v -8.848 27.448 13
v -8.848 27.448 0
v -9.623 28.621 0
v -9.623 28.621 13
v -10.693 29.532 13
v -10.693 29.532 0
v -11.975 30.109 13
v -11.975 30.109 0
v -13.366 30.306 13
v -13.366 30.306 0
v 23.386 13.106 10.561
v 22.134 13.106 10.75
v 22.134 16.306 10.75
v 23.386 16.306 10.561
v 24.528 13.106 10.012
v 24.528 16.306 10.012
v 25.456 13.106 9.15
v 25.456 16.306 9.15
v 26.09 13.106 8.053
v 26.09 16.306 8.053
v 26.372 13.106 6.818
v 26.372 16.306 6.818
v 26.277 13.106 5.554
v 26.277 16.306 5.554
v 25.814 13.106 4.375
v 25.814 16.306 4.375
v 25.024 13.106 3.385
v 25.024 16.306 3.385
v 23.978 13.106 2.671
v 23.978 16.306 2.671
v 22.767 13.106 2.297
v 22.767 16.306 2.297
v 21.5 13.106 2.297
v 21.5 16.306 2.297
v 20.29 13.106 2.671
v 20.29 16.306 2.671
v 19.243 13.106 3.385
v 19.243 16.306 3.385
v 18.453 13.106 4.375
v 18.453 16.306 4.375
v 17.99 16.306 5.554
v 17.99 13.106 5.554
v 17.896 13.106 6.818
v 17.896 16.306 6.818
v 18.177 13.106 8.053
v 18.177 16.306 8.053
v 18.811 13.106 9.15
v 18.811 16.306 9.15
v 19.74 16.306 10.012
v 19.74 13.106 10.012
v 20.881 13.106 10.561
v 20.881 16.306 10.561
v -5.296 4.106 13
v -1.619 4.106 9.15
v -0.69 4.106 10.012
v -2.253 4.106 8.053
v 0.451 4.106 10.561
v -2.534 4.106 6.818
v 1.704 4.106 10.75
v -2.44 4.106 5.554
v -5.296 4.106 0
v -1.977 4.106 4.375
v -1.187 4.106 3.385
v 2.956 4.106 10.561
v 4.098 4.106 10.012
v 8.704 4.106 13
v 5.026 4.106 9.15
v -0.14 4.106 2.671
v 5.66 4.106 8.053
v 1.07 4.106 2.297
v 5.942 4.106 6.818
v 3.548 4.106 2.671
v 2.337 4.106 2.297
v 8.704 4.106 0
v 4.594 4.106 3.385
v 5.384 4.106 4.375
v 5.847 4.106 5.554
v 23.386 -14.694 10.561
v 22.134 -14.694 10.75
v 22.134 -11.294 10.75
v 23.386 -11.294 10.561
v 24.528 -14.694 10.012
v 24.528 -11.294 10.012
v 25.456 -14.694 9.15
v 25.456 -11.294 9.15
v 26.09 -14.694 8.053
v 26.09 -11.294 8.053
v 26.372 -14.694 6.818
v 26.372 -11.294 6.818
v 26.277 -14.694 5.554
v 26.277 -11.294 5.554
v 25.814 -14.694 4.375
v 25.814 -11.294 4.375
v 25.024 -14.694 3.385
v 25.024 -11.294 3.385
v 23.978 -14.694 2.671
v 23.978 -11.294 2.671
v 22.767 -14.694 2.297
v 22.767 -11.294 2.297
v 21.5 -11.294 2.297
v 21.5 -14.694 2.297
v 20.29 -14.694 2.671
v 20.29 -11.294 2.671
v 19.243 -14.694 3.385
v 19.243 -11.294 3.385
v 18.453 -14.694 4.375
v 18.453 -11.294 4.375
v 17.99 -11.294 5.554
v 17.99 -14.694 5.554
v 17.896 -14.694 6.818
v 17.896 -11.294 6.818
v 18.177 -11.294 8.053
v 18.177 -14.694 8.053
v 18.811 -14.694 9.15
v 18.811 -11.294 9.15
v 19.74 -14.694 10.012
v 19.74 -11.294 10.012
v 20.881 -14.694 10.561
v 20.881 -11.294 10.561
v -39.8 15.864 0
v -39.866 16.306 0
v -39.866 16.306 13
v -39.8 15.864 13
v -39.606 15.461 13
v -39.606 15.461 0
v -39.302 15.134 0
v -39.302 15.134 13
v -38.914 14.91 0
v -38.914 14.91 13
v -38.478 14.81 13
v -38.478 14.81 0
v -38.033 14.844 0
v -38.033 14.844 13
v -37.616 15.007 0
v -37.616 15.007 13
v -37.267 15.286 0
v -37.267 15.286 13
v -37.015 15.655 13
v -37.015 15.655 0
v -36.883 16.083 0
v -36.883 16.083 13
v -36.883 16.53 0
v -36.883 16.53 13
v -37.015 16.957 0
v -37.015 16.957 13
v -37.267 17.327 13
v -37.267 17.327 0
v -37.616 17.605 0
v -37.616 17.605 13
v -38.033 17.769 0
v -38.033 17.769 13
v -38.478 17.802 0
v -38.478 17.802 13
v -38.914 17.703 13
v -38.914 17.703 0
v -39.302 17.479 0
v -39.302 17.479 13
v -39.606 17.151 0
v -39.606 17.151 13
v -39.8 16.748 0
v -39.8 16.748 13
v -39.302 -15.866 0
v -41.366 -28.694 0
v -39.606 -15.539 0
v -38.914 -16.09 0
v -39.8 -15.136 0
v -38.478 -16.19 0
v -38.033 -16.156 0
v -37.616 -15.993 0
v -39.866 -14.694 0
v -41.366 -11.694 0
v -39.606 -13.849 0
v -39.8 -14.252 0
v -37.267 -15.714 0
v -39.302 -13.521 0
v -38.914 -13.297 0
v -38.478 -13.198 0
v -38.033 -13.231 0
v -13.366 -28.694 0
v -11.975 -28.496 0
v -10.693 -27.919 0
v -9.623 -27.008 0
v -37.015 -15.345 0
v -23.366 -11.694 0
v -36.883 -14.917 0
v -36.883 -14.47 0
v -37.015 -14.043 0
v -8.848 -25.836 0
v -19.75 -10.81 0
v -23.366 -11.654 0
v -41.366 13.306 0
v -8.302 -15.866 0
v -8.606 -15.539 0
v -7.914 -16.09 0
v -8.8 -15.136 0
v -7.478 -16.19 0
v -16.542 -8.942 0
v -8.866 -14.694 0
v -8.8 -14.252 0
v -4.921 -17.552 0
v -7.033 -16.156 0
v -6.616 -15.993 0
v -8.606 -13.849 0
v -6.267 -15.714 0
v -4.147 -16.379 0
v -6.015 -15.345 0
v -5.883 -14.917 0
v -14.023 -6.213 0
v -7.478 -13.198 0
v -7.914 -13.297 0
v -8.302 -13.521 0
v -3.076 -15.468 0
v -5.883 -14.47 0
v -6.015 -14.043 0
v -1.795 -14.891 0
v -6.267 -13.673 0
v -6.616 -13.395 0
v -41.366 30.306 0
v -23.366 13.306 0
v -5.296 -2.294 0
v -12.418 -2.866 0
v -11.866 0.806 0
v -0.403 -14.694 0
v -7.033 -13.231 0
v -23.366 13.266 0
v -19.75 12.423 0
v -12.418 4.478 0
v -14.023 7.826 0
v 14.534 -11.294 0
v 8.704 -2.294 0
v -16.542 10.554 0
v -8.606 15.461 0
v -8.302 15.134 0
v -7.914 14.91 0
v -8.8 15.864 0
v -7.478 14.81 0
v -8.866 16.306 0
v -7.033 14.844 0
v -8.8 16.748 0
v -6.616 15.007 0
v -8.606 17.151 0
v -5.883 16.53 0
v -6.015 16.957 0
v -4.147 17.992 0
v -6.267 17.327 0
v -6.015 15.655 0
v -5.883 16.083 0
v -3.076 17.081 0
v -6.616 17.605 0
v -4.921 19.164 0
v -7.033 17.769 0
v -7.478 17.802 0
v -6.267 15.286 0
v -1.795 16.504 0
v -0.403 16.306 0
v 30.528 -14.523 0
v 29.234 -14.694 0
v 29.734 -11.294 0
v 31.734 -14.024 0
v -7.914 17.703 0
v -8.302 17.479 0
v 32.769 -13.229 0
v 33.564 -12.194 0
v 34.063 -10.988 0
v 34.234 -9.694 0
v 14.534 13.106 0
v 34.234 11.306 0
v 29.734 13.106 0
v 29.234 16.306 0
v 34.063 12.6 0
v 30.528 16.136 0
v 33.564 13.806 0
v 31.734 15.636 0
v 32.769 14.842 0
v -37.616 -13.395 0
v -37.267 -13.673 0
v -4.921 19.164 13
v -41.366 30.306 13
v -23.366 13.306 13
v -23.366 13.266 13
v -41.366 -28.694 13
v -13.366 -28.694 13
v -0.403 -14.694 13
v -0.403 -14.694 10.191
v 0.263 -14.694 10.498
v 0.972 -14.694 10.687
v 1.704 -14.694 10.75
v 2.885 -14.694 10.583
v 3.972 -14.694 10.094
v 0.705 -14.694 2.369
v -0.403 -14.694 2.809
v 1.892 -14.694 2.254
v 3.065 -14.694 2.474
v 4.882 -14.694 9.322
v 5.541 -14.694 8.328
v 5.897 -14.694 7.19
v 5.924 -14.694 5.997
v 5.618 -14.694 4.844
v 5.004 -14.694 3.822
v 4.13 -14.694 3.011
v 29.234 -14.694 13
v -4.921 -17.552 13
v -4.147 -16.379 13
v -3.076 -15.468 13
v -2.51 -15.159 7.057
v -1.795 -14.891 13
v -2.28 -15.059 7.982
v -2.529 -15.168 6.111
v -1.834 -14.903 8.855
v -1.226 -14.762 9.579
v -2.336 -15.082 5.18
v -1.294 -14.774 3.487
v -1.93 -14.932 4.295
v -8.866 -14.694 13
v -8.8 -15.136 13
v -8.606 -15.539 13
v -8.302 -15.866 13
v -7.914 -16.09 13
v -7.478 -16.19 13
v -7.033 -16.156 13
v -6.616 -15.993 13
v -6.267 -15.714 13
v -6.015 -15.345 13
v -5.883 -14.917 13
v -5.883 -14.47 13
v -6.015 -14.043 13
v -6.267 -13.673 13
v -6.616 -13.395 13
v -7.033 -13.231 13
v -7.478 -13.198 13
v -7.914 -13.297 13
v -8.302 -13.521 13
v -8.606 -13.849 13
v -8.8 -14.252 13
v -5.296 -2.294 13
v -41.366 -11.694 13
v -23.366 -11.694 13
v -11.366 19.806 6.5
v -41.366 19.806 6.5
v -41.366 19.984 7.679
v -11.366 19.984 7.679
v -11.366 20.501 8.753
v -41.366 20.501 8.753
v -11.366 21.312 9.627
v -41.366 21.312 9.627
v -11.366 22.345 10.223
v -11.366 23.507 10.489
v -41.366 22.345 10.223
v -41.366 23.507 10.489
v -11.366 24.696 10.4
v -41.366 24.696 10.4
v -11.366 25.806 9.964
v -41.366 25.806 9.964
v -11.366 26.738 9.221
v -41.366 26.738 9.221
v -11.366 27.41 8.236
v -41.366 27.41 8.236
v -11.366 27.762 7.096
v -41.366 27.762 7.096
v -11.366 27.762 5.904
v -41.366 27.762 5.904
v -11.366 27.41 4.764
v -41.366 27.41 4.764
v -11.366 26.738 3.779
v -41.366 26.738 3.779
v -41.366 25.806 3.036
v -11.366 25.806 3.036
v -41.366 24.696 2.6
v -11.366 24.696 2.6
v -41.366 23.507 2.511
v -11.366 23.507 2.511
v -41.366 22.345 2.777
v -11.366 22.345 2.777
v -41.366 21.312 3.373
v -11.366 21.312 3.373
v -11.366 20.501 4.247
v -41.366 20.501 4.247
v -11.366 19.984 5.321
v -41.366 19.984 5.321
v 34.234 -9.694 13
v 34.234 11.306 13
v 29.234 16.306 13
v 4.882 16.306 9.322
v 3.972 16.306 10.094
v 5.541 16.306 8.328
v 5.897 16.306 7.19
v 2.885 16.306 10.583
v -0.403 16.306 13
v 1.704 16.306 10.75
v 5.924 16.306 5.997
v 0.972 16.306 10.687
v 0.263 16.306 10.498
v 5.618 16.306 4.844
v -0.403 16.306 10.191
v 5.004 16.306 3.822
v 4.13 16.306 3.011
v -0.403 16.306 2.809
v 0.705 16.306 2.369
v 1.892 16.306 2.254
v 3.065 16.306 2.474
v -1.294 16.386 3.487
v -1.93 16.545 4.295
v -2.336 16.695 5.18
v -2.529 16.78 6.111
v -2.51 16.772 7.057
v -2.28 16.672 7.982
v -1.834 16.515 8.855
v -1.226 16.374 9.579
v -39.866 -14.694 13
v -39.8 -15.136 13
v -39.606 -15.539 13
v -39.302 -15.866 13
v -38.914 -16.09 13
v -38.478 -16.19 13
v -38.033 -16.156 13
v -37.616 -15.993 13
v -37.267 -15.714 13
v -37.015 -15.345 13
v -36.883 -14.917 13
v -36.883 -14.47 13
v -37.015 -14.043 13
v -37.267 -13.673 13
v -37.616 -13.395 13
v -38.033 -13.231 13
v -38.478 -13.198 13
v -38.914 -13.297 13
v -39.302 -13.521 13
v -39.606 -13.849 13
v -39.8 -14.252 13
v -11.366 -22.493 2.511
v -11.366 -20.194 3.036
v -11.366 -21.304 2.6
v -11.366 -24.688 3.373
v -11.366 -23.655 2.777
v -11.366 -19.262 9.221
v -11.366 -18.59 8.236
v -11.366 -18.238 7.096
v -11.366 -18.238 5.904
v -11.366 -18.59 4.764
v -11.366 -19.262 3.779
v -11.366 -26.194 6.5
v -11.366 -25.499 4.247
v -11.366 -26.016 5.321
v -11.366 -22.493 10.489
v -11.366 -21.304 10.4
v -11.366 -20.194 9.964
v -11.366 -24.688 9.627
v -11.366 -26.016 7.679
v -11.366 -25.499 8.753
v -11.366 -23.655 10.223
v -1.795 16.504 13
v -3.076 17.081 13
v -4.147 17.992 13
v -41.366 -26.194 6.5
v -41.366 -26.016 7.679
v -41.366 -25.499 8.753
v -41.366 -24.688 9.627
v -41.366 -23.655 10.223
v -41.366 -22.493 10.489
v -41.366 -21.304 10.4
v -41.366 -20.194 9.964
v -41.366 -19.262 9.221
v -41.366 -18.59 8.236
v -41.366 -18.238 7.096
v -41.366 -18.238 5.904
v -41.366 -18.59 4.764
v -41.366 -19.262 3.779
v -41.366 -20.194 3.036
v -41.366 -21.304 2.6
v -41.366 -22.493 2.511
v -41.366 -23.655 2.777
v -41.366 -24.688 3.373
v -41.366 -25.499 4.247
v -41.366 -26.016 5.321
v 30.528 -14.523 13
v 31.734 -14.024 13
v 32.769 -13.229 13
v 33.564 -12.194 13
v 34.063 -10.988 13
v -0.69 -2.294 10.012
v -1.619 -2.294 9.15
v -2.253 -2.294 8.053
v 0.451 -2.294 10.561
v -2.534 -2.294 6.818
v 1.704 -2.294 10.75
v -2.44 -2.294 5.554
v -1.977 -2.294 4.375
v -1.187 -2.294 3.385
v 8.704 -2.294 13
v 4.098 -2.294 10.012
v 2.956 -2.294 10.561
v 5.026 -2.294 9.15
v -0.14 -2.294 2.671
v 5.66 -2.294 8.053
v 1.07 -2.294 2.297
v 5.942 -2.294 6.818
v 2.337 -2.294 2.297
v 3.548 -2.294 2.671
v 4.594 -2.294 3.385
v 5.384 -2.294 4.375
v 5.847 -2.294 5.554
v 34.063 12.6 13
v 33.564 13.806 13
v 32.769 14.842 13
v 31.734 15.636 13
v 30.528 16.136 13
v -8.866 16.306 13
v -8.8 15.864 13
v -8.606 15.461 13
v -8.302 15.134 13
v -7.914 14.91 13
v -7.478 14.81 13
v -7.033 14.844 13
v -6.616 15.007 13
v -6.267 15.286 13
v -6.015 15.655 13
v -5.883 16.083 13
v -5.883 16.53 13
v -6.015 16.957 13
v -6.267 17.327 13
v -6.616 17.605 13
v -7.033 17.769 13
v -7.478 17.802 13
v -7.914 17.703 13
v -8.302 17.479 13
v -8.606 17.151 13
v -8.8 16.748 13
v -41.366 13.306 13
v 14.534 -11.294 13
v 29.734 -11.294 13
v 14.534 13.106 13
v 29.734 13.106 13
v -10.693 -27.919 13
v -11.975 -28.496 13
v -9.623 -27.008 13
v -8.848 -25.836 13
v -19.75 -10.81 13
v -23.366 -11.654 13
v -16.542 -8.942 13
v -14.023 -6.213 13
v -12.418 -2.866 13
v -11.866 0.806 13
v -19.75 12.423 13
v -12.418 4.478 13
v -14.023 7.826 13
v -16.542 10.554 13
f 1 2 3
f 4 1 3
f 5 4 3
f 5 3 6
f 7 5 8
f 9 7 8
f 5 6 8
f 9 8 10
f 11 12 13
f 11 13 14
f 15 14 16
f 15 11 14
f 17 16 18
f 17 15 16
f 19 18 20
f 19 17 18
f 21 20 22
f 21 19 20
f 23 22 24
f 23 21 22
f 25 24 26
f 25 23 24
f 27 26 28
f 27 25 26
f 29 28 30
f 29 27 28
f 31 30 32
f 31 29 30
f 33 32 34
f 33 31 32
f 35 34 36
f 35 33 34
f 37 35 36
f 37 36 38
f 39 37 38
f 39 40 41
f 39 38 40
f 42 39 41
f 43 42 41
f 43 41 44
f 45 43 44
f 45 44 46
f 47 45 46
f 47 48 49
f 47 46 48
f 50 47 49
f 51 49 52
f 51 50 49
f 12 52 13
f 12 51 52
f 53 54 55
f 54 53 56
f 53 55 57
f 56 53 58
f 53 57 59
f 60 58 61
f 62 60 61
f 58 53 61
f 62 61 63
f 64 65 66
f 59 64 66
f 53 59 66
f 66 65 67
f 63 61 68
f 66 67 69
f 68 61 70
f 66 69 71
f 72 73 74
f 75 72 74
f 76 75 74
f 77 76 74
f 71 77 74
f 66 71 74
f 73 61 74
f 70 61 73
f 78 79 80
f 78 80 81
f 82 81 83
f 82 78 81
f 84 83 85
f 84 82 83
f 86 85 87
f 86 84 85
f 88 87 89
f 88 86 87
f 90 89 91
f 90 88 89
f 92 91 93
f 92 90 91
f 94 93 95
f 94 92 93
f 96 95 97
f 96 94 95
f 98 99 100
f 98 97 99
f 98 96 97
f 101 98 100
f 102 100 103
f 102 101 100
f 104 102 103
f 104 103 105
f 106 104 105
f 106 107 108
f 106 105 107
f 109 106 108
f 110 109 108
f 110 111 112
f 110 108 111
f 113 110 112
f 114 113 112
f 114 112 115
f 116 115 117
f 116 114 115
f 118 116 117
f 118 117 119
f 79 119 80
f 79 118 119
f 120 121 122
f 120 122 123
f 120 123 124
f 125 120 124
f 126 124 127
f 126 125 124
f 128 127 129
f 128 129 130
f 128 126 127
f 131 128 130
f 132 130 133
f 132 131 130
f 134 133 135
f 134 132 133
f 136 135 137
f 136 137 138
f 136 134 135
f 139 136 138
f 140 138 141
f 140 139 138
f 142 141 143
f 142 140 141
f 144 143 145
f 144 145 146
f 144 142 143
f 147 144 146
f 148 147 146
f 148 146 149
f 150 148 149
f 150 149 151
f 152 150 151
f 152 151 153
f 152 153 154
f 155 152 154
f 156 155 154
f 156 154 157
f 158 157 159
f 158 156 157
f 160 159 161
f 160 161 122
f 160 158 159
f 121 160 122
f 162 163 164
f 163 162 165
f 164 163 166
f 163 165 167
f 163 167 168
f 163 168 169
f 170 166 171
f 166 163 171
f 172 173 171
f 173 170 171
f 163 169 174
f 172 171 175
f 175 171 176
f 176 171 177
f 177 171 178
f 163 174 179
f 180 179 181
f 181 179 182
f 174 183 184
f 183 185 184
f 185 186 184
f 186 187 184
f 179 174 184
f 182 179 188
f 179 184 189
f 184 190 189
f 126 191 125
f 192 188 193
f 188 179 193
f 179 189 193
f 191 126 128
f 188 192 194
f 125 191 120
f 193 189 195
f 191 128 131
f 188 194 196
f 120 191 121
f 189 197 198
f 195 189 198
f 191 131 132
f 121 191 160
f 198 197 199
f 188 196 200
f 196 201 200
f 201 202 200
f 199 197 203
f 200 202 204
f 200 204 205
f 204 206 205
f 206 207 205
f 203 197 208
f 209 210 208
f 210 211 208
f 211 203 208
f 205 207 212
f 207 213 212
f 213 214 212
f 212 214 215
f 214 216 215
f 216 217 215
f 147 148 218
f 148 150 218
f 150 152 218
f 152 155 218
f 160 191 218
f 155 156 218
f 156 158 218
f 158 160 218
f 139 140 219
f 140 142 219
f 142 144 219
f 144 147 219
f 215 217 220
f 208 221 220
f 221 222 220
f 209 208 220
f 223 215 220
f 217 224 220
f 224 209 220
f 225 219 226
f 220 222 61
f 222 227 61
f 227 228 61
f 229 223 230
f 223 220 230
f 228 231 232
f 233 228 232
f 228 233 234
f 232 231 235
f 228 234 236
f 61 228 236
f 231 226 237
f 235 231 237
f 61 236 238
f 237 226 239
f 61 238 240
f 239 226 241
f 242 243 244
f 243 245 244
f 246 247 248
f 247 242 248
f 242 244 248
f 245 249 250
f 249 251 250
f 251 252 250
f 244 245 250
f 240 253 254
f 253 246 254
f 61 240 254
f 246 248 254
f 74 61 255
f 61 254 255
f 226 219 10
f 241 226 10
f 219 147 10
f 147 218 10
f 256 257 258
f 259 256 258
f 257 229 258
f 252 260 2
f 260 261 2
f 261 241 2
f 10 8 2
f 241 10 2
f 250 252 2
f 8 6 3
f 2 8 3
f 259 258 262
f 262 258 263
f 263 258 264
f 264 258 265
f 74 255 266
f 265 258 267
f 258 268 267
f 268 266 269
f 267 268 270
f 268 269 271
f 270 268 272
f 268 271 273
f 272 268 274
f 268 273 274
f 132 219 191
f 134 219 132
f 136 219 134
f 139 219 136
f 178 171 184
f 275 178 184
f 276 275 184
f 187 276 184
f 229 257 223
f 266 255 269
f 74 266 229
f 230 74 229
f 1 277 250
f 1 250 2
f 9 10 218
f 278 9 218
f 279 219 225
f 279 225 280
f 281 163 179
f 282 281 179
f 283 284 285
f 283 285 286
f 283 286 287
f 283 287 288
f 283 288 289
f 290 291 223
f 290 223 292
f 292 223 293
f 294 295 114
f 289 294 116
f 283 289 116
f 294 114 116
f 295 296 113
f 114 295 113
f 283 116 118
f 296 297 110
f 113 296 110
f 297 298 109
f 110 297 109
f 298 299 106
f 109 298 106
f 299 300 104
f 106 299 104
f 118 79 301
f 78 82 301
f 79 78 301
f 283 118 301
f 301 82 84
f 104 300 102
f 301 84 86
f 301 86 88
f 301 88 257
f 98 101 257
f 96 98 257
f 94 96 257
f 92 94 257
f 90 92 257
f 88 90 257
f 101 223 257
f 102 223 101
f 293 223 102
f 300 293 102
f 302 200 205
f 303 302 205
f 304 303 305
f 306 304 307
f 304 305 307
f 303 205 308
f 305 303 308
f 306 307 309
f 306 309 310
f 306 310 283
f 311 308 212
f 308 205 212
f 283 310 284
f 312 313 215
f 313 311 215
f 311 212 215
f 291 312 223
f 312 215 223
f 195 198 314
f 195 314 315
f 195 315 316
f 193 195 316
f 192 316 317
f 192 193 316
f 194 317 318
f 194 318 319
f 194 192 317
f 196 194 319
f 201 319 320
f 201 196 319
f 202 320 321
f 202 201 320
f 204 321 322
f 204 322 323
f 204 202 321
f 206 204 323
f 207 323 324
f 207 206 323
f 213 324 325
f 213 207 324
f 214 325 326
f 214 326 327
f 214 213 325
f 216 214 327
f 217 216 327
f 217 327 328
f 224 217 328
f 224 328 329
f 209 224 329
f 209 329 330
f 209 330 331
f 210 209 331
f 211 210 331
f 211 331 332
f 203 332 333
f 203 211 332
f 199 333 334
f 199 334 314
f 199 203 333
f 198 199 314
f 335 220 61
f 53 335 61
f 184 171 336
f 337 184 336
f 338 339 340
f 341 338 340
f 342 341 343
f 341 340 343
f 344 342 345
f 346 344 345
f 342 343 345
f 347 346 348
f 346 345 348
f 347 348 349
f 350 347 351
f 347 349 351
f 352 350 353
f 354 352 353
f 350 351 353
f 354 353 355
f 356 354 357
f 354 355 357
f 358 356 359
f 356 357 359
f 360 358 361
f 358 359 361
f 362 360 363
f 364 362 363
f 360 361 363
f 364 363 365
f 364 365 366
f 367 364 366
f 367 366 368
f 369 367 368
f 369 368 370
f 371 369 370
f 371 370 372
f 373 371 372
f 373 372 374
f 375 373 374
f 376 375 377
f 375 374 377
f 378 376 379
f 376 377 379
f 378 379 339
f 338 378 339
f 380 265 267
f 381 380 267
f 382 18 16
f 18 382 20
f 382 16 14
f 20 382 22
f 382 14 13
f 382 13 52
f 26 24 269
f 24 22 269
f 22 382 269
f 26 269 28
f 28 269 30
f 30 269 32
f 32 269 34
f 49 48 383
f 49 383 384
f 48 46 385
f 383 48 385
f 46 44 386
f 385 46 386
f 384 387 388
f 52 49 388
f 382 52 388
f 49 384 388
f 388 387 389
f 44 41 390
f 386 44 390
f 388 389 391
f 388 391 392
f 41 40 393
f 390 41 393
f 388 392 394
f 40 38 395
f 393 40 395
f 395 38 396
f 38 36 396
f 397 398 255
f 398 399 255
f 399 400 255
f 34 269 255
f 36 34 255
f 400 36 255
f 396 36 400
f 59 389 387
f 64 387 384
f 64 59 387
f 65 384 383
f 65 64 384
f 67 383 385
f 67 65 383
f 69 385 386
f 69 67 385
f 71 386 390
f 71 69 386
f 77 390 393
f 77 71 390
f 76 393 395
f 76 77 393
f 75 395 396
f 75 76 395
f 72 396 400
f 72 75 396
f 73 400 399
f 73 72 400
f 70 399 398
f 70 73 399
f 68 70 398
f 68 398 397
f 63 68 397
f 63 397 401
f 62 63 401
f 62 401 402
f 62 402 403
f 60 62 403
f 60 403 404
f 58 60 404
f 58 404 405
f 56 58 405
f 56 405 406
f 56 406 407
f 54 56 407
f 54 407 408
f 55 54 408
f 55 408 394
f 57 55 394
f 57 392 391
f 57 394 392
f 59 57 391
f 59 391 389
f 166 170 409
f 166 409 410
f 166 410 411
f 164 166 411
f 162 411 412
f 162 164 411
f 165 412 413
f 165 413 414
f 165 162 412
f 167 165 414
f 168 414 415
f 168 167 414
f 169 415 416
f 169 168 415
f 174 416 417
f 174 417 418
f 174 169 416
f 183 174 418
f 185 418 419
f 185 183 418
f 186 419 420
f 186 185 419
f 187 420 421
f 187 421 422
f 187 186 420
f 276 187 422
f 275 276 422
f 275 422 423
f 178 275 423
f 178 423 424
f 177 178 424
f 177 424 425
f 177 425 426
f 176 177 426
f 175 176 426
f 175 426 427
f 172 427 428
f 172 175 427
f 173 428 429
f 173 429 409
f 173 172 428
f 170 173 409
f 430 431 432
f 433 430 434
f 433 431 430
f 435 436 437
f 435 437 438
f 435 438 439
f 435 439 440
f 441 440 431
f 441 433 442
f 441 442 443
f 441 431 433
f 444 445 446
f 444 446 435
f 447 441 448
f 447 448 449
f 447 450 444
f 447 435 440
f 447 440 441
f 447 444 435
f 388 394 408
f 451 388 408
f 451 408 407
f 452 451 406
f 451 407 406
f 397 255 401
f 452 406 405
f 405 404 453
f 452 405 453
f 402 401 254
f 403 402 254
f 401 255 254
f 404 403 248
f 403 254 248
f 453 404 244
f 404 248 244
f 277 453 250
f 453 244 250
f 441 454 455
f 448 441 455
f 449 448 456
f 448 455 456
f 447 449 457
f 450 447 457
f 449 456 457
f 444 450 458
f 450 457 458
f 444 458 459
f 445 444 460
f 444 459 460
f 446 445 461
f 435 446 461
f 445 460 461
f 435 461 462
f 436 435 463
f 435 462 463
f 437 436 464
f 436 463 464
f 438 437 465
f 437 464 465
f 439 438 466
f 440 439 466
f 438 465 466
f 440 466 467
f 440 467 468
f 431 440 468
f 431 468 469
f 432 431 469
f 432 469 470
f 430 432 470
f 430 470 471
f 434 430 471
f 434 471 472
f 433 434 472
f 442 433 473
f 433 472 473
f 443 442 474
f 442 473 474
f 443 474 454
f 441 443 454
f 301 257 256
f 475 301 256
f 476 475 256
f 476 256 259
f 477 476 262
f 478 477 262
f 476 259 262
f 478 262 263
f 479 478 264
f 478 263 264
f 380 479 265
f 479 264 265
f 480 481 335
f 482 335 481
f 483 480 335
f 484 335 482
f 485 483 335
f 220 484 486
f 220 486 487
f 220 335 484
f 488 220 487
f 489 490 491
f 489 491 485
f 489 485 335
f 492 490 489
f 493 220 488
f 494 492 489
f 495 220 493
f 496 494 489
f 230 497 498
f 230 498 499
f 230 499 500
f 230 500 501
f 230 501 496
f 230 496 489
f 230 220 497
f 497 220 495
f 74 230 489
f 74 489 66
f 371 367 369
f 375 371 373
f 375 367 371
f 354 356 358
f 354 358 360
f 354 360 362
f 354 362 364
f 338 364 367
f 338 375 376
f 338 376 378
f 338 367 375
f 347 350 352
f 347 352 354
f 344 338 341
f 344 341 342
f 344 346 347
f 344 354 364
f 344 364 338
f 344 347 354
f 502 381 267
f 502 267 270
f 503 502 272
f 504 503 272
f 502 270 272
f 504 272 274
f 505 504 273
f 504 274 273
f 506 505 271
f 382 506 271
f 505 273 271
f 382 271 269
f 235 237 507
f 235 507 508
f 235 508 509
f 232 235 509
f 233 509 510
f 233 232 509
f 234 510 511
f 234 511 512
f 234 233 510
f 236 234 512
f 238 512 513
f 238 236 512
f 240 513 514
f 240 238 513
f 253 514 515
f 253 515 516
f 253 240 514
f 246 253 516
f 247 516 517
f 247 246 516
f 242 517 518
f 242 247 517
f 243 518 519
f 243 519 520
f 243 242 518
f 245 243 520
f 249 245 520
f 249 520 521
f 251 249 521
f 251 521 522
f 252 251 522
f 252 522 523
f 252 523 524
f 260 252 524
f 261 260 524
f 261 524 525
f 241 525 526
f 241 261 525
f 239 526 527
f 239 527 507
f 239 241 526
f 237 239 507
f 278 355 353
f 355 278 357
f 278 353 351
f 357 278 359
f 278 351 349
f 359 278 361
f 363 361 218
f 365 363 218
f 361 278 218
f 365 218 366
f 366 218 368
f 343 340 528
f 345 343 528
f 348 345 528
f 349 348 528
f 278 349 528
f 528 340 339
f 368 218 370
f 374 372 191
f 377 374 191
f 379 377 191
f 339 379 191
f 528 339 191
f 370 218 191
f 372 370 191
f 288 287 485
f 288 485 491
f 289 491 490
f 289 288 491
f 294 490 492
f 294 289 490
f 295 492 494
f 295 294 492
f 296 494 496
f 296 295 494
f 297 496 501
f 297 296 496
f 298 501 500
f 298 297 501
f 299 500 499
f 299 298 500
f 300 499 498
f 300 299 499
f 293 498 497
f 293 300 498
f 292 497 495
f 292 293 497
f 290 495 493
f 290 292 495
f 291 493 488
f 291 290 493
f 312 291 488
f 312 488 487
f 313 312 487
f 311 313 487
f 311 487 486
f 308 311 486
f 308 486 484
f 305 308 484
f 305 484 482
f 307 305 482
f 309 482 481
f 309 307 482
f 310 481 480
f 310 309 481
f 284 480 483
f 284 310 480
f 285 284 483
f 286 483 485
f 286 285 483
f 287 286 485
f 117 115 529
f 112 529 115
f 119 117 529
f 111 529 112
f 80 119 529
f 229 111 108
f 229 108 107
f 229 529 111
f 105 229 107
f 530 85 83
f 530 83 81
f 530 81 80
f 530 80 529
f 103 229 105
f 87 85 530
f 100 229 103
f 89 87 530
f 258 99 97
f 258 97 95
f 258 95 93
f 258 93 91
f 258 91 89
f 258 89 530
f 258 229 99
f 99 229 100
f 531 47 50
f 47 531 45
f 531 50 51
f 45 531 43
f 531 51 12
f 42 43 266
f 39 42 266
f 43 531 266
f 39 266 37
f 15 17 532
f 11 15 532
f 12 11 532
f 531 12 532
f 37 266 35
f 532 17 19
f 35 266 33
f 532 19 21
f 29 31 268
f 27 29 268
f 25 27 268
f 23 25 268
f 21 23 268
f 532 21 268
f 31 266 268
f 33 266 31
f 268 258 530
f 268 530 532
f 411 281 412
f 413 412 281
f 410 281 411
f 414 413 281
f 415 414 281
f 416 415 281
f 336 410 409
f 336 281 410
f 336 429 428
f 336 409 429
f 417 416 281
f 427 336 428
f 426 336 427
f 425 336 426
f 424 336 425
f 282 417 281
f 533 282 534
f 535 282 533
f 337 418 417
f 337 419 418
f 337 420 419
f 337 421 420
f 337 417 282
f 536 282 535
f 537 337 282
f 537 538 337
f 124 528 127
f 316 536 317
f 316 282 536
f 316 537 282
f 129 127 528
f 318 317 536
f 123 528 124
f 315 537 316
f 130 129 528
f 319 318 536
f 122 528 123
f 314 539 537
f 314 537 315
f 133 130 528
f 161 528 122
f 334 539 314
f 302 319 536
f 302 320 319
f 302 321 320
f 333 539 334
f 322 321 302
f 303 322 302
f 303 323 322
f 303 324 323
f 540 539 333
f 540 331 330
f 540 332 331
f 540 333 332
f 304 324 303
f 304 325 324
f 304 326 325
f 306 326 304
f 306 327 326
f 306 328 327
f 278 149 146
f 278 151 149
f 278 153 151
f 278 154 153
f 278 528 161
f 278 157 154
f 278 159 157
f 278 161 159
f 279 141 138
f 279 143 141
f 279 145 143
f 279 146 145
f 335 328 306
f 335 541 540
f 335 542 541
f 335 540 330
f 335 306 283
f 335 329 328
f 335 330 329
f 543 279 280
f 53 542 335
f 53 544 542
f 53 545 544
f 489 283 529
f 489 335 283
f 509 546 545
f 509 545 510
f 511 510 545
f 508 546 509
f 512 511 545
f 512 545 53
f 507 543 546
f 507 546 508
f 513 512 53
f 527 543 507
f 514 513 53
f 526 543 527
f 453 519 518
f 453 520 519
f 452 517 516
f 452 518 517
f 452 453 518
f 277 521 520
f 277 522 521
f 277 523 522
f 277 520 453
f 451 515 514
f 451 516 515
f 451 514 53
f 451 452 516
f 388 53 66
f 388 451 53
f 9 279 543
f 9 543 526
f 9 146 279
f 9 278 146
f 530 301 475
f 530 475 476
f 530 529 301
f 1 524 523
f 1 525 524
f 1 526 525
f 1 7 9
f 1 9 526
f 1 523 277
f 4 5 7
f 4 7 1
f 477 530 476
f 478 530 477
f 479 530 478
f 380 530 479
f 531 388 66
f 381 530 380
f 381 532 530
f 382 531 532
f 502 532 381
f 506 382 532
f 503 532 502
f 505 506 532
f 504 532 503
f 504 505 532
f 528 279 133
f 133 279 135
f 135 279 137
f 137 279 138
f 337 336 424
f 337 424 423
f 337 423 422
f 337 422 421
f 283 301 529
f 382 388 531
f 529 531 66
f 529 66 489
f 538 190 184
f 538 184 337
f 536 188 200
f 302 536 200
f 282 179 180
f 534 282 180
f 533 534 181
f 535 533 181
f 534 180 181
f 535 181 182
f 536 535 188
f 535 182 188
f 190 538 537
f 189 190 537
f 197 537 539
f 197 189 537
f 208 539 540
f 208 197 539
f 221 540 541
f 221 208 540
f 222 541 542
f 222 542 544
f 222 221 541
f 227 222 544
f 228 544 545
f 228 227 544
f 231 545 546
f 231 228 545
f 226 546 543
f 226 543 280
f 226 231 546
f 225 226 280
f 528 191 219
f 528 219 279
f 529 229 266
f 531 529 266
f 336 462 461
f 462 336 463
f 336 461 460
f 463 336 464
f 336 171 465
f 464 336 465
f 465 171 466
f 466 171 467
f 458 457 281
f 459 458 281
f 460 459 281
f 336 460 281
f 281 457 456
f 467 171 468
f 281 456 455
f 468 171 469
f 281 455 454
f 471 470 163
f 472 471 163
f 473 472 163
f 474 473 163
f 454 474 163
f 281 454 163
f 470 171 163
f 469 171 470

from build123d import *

# Parameters (mm, degrees)
CROQUIS2_R                 = 1.5
CROQUIS2_R_2               = 12.5
CROQUIS2_W                 = 14
CROQUIS2_H                 = 6.4
CROQUIS2_W_2               = 15.2
CROQUIS2_H_2               = 24.4
SALIENTE_EXTRUIR1_DEPTH    = 13
CROQUIS3_R                 = 4
CORTAR_EXTRUIR1_DEPTH      = 30
CROQUIS4_W                 = 13
CROQUIS4_H                 = 25
CORTAR_EXTRUIR2_DEPTH      = 18
CORTAR_EXTRUIR3_DEPTH      = 63.491392709
CORTAR_EXTRUIR3_DEPTH_BACK = 63.491392709
CROQUIS5_R                 = 4.25


with BuildPart() as part:
    # Croquis2 → Saliente-Extruir1 (new body)
    # profile 1 of 2: a face of its own
    with BuildSketch(Plane.XY):
        with BuildLine():
            Line((-41.366340939, 30.306283288), (-41.366340939, 19.306283288))
            Line((-41.366340939, 19.306283288), (-41.366340939, -17.693716712))
            Line((-41.366340939, -17.693716712), (-41.366340939, -28.693716712))
            Line((-41.366340939, -28.693716712), (-13.366340939, -28.693716712))
            ThreePointArc((-13.366340939, -28.693716712), (-10.693254692, -27.919188273), (-8.848320971, -25.835560677))
            Line((-8.848320971, -25.835560677), (-4.921298265, -17.551872747))
            ThreePointArc((-4.921298265, -17.551872747), (-3.076364545, -15.468245151), (-0.403278298, -14.693716712))
            Line((-0.403278298, -14.693716712), (29.233659061, -14.693716712))
            ThreePointArc((29.233659061, -14.693716712), (32.769192967, -13.229250618), (34.233659061, -9.693716712))
            Line((34.233659061, -9.693716712), (34.233659061, 11.306283288))
            ThreePointArc((34.233659061, 11.306283288), (32.769192967, 14.841817194), (29.233659061, 16.306283288))
            Line((29.233659061, 16.306283288), (-0.403278298, 16.306283288))
            ThreePointArc((-0.403278298, 16.306283288), (-3.076364545, 17.080811727), (-4.921298265, 19.164439323))
            Line((-4.921298265, 19.164439323), (-8.848320971, 27.448127253))
            ThreePointArc((-8.848320971, 27.448127253), (-10.693254692, 29.531754849), (-13.366340939, 30.306283288))
            Line((-13.366340939, 30.306283288), (-41.366340939, 30.306283288))
        make_face()
        with Locations(Location((-38.366340939, -14.693716712, 0), (0, 0, 180))):
            Circle(CROQUIS2_R, mode=Mode.SUBTRACT)
        with Locations(Location((-7.366340939, -14.693716712, 0), (0, 0, 180))):
            Circle(CROQUIS2_R, mode=Mode.SUBTRACT)
        with Locations(Location((-24.366340939, 0.806283288, 0), (0, 0, 180))):
            Circle(CROQUIS2_R_2, mode=Mode.SUBTRACT)
        with Locations(Location((-38.366340939, 16.306283288, 0), (0, 0, 180))):
            Circle(CROQUIS2_R, mode=Mode.SUBTRACT)
        with Locations(Location((-7.366340939, 16.306283288, 0), (0, 0, 180))):
            Circle(CROQUIS2_R, mode=Mode.SUBTRACT)
        with Locations((1.703659061, 0.906283288)):
            Rectangle(CROQUIS2_W, CROQUIS2_H, mode=Mode.SUBTRACT)
        with Locations((22.133659061, 0.906283288)):
            Rectangle(CROQUIS2_W_2, CROQUIS2_H_2, mode=Mode.SUBTRACT)
    # profile 2 of 2: a face of its own
    with BuildSketch(Plane.XY):
        with BuildLine():
            Line((-41.366340939, 30.306283288), (-41.366340939, 19.306283288))
            Line((-41.366340939, 19.306283288), (-41.366340939, -17.693716712))
            Line((-41.366340939, -17.693716712), (-41.366340939, -28.693716712))
            Line((-41.366340939, -28.693716712), (-13.366340939, -28.693716712))
            ThreePointArc((-13.366340939, -28.693716712), (-10.693254692, -27.919188273), (-8.848320971, -25.835560677))
            Line((-8.848320971, -25.835560677), (-4.921298265, -17.551872747))
            ThreePointArc((-4.921298265, -17.551872747), (-3.076364545, -15.468245151), (-0.403278298, -14.693716712))
            Line((-0.403278298, -14.693716712), (29.233659061, -14.693716712))
            ThreePointArc((29.233659061, -14.693716712), (32.769192967, -13.229250618), (34.233659061, -9.693716712))
            Line((34.233659061, -9.693716712), (34.233659061, 11.306283288))
            ThreePointArc((34.233659061, 11.306283288), (32.769192967, 14.841817194), (29.233659061, 16.306283288))
            Line((29.233659061, 16.306283288), (-0.403278298, 16.306283288))
            ThreePointArc((-0.403278298, 16.306283288), (-3.076364545, 17.080811727), (-4.921298265, 19.164439323))
            Line((-4.921298265, 19.164439323), (-8.848320971, 27.448127253))
            ThreePointArc((-8.848320971, 27.448127253), (-10.693254692, 29.531754849), (-13.366340939, 30.306283288))
            Line((-13.366340939, 30.306283288), (-41.366340939, 30.306283288))
        make_face()
        with Locations(Location((-38.366340939, -14.693716712, 0), (0, 0, 180))):
            Circle(CROQUIS2_R, mode=Mode.SUBTRACT)
        with Locations(Location((-7.366340939, -14.693716712, 0), (0, 0, 180))):
            Circle(CROQUIS2_R, mode=Mode.SUBTRACT)
        with Locations(Location((-24.366340939, 0.806283288, 0), (0, 0, 180))):
            Circle(CROQUIS2_R_2, mode=Mode.SUBTRACT)
        with Locations(Location((-38.366340939, 16.306283288, 0), (0, 0, 180))):
            Circle(CROQUIS2_R, mode=Mode.SUBTRACT)
        with Locations(Location((-7.366340939, 16.306283288, 0), (0, 0, 180))):
            Circle(CROQUIS2_R, mode=Mode.SUBTRACT)
        with Locations((1.703659061, 0.906283288)):
            Rectangle(CROQUIS2_W, CROQUIS2_H, mode=Mode.SUBTRACT)
        with Locations((22.133659061, 0.906283288)):
            Rectangle(CROQUIS2_W_2, CROQUIS2_H_2, mode=Mode.SUBTRACT)
    extrude(amount=SALIENTE_EXTRUIR1_DEPTH)

    # Croquis3 → Cortar-Extruir1 (cut)
    with BuildSketch(Plane.ZY.offset(41.366340939)):
        with Locations(Location((6.5, 23.806283288, 0), (0, 0, 270))):
            Circle(CROQUIS3_R)
        with Locations(Location((6.5, -22.193716712, 0), (0, 0, 270))):
            Circle(CROQUIS3_R)
    extrude(amount=-CORTAR_EXTRUIR1_DEPTH, mode=Mode.SUBTRACT)

    # Croquis4 → Cortar-Extruir2 (cut)
    with BuildSketch(Plane.ZY.offset(41.366340939)):
        with Locations((6.5, 0.806283288)):
            Rectangle(CROQUIS4_W, CROQUIS4_H)
    extrude(amount=-CORTAR_EXTRUIR2_DEPTH, mode=Mode.SUBTRACT)

    # Croquis5 → Cortar-Extruir3 (cut, two sides: drawn at the far end of the back side and taken through both)
    with BuildSketch(Plane(origin=(0, 16.306283288, 0), x_dir=(1, 0, 0), z_dir=(0, 1, 0)).offset(-CORTAR_EXTRUIR3_DEPTH_BACK)):
        with Locations(Location((22.133659061, -6.5, 0), (0, 0, 270))):
            Circle(CROQUIS5_R)
        with Locations(Location((1.703659061, -6.5, 0), (0, 0, 270))):
            Circle(CROQUIS5_R)
    extrude(amount=CORTAR_EXTRUIR3_DEPTH + CORTAR_EXTRUIR3_DEPTH_BACK, mode=Mode.SUBTRACT)


solid = part.part
